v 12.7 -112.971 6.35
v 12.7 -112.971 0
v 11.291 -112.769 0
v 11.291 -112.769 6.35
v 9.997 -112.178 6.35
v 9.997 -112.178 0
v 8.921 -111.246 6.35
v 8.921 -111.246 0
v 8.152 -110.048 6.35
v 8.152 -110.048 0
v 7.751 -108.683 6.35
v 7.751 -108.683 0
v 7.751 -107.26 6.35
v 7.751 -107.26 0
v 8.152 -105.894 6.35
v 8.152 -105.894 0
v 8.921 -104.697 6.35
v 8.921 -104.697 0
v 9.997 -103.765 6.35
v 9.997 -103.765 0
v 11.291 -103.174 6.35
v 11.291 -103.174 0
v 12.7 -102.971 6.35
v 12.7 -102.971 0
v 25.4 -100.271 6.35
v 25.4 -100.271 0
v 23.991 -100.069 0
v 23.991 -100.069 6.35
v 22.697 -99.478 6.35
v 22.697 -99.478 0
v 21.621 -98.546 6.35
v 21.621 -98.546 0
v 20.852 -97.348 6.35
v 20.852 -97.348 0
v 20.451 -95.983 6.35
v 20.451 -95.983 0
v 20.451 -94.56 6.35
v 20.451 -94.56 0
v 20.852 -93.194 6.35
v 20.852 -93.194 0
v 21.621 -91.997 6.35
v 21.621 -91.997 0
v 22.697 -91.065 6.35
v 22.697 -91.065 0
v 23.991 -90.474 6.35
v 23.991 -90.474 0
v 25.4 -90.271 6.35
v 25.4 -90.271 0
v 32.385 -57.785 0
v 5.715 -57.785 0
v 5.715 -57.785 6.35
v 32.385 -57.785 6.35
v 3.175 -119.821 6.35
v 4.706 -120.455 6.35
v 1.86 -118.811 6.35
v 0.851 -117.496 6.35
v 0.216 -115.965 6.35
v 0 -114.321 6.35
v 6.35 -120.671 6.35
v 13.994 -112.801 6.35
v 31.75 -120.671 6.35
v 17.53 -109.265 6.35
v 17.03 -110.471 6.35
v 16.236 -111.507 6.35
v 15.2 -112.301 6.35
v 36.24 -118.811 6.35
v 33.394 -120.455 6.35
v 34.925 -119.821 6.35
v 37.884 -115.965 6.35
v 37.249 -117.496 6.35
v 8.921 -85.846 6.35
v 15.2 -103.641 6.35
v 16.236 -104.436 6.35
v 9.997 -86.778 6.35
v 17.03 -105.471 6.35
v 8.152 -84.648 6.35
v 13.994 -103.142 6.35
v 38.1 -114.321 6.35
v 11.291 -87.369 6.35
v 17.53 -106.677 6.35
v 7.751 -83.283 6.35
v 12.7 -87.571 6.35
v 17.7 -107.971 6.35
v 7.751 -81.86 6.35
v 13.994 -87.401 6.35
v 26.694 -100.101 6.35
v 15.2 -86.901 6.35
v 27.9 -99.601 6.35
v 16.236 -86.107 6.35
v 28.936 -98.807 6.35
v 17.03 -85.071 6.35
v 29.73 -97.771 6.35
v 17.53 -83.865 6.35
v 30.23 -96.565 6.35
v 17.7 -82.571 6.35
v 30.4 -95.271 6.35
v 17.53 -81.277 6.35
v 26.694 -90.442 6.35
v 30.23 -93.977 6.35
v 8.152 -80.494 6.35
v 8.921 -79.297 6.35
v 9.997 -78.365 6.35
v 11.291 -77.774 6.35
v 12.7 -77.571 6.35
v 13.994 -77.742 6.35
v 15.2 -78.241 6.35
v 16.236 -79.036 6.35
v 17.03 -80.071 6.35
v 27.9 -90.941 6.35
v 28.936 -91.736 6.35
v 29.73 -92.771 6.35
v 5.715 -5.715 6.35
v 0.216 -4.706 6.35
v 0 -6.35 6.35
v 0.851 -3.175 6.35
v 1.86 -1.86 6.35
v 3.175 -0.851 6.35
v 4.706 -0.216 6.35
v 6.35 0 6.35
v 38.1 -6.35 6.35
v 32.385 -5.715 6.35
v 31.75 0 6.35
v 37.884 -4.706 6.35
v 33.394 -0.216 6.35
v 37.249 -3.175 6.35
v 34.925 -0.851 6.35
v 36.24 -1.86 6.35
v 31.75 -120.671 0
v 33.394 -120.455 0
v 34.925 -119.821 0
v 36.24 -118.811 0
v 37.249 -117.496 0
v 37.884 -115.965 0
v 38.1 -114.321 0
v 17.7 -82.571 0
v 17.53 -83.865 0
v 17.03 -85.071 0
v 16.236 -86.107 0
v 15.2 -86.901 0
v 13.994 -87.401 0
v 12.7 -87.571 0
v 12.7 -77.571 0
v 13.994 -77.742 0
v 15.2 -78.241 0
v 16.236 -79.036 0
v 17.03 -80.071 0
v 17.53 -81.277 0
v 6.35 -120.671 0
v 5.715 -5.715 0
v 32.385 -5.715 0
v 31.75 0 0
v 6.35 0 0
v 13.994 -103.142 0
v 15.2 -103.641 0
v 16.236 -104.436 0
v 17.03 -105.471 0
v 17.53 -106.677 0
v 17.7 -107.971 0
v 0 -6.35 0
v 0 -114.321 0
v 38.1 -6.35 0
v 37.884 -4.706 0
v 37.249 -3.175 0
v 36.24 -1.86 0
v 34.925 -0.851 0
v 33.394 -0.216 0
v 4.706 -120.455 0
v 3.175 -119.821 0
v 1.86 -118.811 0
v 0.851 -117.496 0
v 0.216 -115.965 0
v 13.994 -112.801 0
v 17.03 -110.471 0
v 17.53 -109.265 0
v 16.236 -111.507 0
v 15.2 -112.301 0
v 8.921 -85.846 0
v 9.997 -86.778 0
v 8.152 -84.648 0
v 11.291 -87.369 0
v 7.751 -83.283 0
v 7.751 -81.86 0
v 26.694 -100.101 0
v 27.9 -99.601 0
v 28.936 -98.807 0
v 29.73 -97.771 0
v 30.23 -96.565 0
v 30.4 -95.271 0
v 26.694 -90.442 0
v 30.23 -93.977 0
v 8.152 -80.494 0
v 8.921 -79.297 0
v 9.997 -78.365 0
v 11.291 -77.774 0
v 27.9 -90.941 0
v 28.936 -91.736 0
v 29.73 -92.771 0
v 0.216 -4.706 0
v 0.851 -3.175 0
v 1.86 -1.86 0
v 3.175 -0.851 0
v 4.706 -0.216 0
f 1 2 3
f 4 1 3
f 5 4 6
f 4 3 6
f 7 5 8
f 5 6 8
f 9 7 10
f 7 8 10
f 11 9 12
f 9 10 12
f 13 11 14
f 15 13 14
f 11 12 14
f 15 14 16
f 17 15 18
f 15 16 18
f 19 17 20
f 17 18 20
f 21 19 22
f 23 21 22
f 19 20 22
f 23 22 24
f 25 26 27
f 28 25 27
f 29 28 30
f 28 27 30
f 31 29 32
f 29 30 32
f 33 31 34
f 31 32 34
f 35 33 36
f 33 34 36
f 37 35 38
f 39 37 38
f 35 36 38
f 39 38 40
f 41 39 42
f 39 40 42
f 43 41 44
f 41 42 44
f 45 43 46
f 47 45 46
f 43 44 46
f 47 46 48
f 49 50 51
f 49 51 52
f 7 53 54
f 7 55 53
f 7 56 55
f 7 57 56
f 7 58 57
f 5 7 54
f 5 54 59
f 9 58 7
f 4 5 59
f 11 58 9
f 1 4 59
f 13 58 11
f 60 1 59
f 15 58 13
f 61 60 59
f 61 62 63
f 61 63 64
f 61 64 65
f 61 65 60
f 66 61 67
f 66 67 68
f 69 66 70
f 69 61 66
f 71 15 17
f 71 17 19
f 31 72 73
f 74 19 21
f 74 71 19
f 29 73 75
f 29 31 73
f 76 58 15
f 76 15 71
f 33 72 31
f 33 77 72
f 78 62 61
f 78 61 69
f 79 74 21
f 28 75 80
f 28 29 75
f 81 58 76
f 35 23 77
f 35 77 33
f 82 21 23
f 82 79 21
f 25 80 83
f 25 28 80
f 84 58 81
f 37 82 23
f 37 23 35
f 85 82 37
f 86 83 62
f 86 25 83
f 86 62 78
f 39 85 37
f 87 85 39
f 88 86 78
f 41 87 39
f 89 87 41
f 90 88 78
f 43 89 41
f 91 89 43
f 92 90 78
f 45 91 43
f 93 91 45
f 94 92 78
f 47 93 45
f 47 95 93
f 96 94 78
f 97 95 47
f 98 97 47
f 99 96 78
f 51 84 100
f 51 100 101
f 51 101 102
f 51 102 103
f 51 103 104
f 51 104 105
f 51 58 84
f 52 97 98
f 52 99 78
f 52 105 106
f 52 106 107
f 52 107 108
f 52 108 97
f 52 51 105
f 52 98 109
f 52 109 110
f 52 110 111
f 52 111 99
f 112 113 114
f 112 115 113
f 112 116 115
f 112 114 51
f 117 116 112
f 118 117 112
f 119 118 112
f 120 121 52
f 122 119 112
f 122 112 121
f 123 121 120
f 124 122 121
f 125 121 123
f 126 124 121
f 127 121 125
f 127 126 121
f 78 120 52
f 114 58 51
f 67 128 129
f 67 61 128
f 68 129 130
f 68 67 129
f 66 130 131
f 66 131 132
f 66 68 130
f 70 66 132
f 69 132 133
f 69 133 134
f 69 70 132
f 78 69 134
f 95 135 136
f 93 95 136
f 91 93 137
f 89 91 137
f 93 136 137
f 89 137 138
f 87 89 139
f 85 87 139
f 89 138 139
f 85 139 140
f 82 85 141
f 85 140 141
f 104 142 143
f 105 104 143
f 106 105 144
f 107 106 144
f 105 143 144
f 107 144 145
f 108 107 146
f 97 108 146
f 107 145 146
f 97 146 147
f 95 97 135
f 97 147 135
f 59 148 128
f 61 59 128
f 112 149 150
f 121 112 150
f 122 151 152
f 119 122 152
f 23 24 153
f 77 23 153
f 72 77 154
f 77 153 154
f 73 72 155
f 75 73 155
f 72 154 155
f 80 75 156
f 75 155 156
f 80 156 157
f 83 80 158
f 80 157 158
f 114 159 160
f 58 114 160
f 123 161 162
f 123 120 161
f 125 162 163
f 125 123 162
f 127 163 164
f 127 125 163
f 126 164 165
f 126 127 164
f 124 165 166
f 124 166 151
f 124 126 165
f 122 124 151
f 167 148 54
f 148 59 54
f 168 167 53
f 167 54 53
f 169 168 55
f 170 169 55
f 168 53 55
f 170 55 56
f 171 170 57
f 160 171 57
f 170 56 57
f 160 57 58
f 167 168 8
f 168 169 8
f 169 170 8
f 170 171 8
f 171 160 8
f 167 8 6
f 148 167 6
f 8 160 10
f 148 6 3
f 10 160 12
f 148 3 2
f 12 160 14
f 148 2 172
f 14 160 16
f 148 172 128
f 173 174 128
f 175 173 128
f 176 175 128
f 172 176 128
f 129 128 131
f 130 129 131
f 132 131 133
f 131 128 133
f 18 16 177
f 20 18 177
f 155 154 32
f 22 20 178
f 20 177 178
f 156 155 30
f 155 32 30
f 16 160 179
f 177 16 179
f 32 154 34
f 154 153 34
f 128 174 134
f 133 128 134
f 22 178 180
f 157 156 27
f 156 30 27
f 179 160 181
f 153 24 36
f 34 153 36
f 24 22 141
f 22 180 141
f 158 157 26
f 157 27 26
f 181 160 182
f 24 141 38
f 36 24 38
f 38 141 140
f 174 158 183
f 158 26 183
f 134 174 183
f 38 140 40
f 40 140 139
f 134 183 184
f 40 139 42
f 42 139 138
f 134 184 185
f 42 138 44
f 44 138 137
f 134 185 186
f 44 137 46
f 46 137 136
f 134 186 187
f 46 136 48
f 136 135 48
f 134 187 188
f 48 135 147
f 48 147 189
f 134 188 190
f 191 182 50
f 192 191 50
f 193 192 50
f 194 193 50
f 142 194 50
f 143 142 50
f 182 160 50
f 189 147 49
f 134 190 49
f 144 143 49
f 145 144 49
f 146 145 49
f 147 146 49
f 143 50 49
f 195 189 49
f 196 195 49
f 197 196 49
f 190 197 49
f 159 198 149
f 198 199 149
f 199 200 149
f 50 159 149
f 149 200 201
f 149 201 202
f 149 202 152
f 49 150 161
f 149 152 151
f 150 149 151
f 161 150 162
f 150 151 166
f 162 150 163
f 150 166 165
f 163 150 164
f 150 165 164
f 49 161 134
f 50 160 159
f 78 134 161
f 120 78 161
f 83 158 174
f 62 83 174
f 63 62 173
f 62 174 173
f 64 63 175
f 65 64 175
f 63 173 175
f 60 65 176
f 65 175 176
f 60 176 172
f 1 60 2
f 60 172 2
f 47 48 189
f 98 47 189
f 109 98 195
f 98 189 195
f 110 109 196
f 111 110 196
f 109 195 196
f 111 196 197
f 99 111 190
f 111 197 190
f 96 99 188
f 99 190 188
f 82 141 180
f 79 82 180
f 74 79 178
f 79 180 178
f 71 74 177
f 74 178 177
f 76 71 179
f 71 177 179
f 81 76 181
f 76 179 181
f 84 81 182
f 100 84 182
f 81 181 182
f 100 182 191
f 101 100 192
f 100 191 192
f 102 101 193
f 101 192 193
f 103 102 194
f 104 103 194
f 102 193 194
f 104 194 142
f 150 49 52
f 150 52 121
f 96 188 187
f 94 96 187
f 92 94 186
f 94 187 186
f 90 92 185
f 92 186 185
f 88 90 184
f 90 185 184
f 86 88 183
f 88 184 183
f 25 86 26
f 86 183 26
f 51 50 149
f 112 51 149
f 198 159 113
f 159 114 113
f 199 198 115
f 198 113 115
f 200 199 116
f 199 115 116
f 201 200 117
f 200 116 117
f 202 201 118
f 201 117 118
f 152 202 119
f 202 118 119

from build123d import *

# Parameters (mm, degrees)
SKETCH1_W           = 26.67
SKETCH1_H           = 52.07
BOSS_EXTRUDE1_DEPTH = 6.35
FILLET1_R           = 6.35


with BuildPart() as part:
    # Sketch1 → Boss-Extrude1 (new body)
    with BuildSketch(Plane.XY):
        with BuildLine():
            Line((12.7, -63.5), (0, -63.5))
            Line((0, -63.5), (0, -120.671250195))
            Line((0, -120.671250195), (12.7, -120.671250195))
            Line((12.7, -120.671250195), (12.7, -112.971250195))
            ThreePointArc((12.7, -112.971250195), (7.7, -107.971250195), (12.7, -102.971250195))
            Line((12.7, -102.971250195), (12.7, -87.571250195))
            ThreePointArc((12.7, -87.571250195), (7.7, -82.571250195), (12.7, -77.571250195))
            Line((12.7, -77.571250195), (12.7, -63.5))
        make_face()
        with BuildLine():
            Line((25.4, -63.5), (12.7, -63.5))
            Line((12.7, -63.5), (12.7, -77.571250195))
            ThreePointArc((12.7, -77.571250195), (16.235533906, -79.035716289), (17.7, -82.571250195))
            ThreePointArc((17.7, -82.571250195), (16.235533906, -86.106784101), (12.7, -87.571250195))
            Line((12.7, -87.571250195), (12.7, -102.971250195))
            ThreePointArc((12.7, -102.971250195), (16.235533906, -104.435716289), (17.7, -107.971250195))
            ThreePointArc((17.7, -107.971250195), (16.235533906, -111.506784101), (12.7, -112.971250195))
            Line((12.7, -112.971250195), (12.7, -120.671250195))
            Line((12.7, -120.671250195), (25.4, -120.671250195))
            Line((25.4, -120.671250195), (25.4, -100.271250195))
            ThreePointArc((25.4, -100.271250195), (20.4, -95.271250195), (25.4, -90.271250195))
            Line((25.4, -90.271250195), (25.4, -63.5))
        make_face()
        with BuildLine():
            Line((38.1, -120.671250195), (38.1, -63.5))
            Line((38.1, -63.5), (25.4, -63.5))
            Line((25.4, -63.5), (25.4, -90.271250195))
            ThreePointArc((25.4, -90.271250195), (28.935533906, -91.735716289), (30.4, -95.271250195))
            ThreePointArc((30.4, -95.271250195), (28.935533906, -98.806784101), (25.4, -100.271250195))
            Line((25.4, -100.271250195), (25.4, -120.671250195))
            Line((25.4, -120.671250195), (38.1, -120.671250195))
        make_face()
        Polygon((38.1, 0), (0, 0), (0, -63.5), (12.7, -63.5), (25.4, -63.5), (38.1, -63.5), align=None)
        with Locations((19.05, -31.75)):
            Rectangle(SKETCH1_W, SKETCH1_H, mode=Mode.SUBTRACT)
    extrude(amount=BOSS_EXTRUDE1_DEPTH)

    # Fillet1
    fillet1_edges = [part.edges().sort_by_distance(p)[0] for p in [
        (0, -120.671250195, 3.175),
        (0, 0, 3.175),
        (38.1, 0, 3.175),
        (38.1, -120.671250195, 3.175),
    ]]
    fillet(fillet1_edges, radius=FILLET1_R)


solid = part.part
